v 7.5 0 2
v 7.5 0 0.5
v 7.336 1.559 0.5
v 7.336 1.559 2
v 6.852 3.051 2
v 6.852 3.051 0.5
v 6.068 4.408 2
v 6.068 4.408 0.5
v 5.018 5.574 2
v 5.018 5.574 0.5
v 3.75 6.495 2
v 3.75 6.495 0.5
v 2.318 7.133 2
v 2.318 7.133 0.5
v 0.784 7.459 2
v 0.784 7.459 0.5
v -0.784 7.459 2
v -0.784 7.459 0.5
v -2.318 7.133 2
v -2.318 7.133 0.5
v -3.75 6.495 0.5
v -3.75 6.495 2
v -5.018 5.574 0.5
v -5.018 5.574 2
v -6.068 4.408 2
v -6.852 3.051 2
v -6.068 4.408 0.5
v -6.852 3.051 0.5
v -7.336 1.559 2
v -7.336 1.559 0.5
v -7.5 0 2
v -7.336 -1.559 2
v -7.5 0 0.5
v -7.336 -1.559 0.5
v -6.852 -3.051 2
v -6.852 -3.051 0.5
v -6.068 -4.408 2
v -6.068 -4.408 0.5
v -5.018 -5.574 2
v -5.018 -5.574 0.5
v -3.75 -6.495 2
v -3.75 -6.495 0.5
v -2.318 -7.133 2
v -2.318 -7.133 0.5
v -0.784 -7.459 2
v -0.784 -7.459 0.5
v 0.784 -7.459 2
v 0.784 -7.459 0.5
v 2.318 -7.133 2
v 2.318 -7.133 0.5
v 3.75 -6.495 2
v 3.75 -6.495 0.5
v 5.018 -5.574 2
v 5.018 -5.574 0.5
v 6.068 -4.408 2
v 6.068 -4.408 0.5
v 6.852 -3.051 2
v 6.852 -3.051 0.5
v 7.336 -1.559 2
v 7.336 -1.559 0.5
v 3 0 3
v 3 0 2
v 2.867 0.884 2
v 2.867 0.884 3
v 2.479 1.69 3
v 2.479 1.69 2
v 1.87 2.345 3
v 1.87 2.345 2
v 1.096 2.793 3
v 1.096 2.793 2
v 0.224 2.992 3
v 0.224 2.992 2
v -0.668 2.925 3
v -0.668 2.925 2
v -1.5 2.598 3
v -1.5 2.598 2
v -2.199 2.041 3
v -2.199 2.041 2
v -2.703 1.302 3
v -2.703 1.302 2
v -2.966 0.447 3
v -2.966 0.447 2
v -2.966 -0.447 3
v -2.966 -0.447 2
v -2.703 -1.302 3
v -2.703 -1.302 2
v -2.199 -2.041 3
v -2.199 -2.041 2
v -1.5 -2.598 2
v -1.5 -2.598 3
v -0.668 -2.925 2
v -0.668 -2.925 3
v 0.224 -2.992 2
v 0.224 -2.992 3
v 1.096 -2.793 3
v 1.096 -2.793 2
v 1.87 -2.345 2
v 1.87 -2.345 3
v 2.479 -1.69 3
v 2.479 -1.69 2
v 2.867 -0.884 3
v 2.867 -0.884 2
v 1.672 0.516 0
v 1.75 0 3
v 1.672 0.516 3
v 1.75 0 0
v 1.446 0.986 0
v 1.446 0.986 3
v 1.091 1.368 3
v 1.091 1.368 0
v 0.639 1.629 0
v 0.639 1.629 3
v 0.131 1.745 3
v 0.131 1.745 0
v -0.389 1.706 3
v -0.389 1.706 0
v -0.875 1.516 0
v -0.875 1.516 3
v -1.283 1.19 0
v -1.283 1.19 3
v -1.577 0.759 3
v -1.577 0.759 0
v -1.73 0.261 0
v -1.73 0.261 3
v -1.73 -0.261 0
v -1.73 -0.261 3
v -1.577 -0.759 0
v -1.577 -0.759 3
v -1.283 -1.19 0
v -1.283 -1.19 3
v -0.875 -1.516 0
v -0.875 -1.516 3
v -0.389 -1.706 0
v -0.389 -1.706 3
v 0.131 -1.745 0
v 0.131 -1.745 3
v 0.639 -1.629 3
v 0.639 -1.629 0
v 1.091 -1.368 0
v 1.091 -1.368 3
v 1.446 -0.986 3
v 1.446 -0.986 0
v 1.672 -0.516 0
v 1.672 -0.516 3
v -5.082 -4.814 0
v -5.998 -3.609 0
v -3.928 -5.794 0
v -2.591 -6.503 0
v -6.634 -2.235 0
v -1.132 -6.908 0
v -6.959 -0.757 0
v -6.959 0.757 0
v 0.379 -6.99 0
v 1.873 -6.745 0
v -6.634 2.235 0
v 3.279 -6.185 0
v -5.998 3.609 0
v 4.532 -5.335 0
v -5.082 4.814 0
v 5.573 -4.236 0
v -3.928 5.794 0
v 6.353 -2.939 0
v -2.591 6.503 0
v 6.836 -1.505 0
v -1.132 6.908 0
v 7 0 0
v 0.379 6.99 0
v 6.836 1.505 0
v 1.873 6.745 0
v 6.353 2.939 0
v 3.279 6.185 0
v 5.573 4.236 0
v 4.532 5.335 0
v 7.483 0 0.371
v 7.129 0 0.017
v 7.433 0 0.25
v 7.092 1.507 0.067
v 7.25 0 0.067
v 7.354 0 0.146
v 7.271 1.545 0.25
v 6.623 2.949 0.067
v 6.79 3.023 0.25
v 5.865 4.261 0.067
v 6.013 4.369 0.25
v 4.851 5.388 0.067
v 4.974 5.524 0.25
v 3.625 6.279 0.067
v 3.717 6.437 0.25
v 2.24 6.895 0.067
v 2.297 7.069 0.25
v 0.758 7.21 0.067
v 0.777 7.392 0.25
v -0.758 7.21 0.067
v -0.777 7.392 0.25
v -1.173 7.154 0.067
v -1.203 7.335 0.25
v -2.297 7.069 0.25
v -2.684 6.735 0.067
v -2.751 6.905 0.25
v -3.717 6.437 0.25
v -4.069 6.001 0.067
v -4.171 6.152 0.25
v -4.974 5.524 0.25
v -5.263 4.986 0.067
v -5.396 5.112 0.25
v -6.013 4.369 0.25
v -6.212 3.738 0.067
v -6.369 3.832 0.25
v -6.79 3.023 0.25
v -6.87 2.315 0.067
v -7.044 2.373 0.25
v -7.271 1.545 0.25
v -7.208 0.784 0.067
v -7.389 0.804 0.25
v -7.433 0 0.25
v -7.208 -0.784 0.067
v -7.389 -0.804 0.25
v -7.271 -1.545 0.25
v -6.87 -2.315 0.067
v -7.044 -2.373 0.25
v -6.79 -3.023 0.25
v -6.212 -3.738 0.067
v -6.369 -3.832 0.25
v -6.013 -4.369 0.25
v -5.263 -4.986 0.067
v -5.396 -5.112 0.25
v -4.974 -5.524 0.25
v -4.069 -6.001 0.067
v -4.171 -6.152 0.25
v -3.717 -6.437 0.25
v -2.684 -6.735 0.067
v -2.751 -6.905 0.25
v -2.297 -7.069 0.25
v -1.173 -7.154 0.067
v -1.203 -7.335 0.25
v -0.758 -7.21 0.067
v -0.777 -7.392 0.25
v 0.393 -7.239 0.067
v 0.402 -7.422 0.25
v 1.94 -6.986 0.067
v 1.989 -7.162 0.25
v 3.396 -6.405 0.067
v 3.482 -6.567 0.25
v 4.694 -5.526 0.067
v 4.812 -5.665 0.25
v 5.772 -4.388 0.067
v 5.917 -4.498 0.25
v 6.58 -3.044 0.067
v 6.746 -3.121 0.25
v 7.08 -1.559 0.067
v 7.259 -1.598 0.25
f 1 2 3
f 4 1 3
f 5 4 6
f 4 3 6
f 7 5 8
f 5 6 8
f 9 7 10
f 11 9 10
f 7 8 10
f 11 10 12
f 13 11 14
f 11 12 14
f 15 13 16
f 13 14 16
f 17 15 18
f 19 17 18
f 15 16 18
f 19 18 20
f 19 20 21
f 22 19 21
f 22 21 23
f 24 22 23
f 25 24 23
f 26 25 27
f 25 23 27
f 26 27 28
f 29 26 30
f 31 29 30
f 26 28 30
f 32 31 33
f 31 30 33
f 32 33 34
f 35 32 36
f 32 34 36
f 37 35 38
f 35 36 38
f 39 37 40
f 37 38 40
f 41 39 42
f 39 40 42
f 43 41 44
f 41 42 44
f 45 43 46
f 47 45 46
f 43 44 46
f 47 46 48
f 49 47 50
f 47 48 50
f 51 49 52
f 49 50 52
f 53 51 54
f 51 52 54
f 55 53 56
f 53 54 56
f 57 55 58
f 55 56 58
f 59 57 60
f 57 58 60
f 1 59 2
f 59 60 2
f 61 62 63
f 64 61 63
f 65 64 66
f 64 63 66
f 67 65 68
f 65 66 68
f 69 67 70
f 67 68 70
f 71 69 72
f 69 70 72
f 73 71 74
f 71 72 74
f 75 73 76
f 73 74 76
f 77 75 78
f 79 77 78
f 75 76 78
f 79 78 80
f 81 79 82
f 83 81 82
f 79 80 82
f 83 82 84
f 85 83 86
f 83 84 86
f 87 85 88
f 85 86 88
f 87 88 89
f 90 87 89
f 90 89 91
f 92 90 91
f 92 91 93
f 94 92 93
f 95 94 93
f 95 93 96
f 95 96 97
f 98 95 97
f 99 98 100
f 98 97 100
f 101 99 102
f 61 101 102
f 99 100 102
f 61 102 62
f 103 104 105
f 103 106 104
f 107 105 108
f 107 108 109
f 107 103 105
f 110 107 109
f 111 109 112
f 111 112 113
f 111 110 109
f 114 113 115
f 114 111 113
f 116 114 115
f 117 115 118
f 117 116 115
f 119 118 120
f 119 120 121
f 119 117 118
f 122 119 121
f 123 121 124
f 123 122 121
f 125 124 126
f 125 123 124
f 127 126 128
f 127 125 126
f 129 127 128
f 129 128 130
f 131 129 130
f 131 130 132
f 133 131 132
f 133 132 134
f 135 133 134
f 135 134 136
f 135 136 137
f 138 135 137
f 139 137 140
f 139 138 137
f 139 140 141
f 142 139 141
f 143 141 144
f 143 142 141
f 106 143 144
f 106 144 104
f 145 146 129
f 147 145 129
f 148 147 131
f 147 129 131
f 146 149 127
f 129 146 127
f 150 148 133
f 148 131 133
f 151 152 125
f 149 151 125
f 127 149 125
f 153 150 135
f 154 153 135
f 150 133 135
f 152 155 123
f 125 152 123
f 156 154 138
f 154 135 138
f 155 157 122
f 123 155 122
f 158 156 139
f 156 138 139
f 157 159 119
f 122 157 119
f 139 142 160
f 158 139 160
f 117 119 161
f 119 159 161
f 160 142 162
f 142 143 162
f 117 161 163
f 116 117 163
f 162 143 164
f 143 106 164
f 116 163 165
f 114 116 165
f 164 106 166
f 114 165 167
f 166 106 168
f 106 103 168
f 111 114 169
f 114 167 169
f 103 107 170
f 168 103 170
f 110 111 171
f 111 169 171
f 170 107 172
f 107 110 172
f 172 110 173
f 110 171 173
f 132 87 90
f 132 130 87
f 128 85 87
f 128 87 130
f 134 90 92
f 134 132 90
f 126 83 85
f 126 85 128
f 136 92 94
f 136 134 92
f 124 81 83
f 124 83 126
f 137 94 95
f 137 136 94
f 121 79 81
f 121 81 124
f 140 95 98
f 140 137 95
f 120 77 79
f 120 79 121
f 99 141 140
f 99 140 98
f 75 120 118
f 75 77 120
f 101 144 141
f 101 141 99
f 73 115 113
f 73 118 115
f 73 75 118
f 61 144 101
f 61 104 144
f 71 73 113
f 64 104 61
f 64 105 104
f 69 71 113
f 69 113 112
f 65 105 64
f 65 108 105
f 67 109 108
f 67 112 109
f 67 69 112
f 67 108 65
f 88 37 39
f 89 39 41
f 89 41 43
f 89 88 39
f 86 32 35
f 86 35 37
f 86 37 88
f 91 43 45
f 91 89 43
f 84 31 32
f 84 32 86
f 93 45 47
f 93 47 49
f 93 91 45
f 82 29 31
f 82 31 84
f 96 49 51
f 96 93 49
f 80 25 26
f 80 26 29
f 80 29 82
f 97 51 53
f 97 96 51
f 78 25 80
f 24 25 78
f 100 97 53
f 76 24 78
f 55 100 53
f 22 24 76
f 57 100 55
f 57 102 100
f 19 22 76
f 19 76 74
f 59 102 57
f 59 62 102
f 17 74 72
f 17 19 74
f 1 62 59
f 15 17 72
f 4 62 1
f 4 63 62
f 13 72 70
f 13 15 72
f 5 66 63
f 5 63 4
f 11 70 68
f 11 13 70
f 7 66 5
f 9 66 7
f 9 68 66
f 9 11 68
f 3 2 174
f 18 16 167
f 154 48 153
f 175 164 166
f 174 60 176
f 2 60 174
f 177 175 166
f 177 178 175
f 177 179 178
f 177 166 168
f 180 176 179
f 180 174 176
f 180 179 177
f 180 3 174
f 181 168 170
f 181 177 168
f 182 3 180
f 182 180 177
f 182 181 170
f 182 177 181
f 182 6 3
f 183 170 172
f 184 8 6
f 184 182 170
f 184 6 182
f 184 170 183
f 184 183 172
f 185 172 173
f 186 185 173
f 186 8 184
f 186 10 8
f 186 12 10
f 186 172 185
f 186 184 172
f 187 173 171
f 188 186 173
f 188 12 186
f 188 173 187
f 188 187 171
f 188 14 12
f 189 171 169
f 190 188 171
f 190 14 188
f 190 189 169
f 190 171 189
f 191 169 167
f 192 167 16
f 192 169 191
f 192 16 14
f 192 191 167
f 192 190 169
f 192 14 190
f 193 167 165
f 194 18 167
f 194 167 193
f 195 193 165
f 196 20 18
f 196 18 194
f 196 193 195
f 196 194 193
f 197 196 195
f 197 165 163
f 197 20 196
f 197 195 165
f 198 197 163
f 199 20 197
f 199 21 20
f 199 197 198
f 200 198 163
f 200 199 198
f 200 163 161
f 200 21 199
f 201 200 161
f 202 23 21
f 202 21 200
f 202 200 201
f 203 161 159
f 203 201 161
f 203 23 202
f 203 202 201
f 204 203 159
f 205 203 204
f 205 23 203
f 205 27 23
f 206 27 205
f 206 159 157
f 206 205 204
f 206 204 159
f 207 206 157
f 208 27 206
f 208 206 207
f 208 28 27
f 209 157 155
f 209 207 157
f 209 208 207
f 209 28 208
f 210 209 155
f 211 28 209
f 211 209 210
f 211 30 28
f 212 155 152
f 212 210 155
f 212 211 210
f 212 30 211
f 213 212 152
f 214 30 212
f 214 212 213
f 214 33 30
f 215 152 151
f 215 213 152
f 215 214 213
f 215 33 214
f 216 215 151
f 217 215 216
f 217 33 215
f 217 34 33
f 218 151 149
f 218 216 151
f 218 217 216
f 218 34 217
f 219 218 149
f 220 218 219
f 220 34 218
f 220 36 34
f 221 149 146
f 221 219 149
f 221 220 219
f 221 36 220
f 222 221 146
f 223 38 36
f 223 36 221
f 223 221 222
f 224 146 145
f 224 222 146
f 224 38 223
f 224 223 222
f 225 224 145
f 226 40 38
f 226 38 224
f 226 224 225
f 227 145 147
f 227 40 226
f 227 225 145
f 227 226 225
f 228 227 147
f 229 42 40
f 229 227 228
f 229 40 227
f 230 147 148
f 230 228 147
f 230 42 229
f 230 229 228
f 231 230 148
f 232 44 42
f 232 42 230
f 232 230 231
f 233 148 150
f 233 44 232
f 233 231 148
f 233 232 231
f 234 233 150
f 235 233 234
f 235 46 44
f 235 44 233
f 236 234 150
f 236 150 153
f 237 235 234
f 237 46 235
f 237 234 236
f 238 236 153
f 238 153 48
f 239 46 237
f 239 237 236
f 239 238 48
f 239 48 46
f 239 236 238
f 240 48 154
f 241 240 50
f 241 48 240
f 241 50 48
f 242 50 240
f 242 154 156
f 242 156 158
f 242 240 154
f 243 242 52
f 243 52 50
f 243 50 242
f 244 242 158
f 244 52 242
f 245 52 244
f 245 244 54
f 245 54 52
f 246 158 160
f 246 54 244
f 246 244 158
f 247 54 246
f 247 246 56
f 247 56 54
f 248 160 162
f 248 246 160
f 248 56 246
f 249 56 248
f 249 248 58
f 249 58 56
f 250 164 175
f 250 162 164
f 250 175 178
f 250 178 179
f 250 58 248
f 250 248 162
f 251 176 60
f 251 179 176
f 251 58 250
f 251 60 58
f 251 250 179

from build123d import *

# Parameters (mm, degrees)
SKETCH1_R           = 7.5
SKETCH1_R_2         = 1.75
BOSS_EXTRUDE1_DEPTH = 2
SKETCH2_R           = 3
SKETCH2_R_2         = 1.75
BOSS_EXTRUDE2_DEPTH = 1
FILLET1_R           = 0.5


with BuildPart() as part:
    # Sketch1 → Boss-Extrude1 (new body)
    with BuildSketch(Plane.XY):
        Circle(SKETCH1_R)
        Circle(SKETCH1_R_2, mode=Mode.SUBTRACT)
    extrude(amount=BOSS_EXTRUDE1_DEPTH)

    # Sketch2 → Boss-Extrude2 (add)
    with BuildSketch(Plane.XY.offset(2)):
        Circle(SKETCH2_R)
        Circle(SKETCH2_R_2, mode=Mode.SUBTRACT)
    extrude(amount=BOSS_EXTRUDE2_DEPTH)

    # Fillet1
    fillet1_edges = [part.edges().sort_by_distance(p)[0] for p in [
        (-7.5, 0, 0),
    ]]
    fillet(fillet1_edges, radius=FILLET1_R)


solid = part.part
